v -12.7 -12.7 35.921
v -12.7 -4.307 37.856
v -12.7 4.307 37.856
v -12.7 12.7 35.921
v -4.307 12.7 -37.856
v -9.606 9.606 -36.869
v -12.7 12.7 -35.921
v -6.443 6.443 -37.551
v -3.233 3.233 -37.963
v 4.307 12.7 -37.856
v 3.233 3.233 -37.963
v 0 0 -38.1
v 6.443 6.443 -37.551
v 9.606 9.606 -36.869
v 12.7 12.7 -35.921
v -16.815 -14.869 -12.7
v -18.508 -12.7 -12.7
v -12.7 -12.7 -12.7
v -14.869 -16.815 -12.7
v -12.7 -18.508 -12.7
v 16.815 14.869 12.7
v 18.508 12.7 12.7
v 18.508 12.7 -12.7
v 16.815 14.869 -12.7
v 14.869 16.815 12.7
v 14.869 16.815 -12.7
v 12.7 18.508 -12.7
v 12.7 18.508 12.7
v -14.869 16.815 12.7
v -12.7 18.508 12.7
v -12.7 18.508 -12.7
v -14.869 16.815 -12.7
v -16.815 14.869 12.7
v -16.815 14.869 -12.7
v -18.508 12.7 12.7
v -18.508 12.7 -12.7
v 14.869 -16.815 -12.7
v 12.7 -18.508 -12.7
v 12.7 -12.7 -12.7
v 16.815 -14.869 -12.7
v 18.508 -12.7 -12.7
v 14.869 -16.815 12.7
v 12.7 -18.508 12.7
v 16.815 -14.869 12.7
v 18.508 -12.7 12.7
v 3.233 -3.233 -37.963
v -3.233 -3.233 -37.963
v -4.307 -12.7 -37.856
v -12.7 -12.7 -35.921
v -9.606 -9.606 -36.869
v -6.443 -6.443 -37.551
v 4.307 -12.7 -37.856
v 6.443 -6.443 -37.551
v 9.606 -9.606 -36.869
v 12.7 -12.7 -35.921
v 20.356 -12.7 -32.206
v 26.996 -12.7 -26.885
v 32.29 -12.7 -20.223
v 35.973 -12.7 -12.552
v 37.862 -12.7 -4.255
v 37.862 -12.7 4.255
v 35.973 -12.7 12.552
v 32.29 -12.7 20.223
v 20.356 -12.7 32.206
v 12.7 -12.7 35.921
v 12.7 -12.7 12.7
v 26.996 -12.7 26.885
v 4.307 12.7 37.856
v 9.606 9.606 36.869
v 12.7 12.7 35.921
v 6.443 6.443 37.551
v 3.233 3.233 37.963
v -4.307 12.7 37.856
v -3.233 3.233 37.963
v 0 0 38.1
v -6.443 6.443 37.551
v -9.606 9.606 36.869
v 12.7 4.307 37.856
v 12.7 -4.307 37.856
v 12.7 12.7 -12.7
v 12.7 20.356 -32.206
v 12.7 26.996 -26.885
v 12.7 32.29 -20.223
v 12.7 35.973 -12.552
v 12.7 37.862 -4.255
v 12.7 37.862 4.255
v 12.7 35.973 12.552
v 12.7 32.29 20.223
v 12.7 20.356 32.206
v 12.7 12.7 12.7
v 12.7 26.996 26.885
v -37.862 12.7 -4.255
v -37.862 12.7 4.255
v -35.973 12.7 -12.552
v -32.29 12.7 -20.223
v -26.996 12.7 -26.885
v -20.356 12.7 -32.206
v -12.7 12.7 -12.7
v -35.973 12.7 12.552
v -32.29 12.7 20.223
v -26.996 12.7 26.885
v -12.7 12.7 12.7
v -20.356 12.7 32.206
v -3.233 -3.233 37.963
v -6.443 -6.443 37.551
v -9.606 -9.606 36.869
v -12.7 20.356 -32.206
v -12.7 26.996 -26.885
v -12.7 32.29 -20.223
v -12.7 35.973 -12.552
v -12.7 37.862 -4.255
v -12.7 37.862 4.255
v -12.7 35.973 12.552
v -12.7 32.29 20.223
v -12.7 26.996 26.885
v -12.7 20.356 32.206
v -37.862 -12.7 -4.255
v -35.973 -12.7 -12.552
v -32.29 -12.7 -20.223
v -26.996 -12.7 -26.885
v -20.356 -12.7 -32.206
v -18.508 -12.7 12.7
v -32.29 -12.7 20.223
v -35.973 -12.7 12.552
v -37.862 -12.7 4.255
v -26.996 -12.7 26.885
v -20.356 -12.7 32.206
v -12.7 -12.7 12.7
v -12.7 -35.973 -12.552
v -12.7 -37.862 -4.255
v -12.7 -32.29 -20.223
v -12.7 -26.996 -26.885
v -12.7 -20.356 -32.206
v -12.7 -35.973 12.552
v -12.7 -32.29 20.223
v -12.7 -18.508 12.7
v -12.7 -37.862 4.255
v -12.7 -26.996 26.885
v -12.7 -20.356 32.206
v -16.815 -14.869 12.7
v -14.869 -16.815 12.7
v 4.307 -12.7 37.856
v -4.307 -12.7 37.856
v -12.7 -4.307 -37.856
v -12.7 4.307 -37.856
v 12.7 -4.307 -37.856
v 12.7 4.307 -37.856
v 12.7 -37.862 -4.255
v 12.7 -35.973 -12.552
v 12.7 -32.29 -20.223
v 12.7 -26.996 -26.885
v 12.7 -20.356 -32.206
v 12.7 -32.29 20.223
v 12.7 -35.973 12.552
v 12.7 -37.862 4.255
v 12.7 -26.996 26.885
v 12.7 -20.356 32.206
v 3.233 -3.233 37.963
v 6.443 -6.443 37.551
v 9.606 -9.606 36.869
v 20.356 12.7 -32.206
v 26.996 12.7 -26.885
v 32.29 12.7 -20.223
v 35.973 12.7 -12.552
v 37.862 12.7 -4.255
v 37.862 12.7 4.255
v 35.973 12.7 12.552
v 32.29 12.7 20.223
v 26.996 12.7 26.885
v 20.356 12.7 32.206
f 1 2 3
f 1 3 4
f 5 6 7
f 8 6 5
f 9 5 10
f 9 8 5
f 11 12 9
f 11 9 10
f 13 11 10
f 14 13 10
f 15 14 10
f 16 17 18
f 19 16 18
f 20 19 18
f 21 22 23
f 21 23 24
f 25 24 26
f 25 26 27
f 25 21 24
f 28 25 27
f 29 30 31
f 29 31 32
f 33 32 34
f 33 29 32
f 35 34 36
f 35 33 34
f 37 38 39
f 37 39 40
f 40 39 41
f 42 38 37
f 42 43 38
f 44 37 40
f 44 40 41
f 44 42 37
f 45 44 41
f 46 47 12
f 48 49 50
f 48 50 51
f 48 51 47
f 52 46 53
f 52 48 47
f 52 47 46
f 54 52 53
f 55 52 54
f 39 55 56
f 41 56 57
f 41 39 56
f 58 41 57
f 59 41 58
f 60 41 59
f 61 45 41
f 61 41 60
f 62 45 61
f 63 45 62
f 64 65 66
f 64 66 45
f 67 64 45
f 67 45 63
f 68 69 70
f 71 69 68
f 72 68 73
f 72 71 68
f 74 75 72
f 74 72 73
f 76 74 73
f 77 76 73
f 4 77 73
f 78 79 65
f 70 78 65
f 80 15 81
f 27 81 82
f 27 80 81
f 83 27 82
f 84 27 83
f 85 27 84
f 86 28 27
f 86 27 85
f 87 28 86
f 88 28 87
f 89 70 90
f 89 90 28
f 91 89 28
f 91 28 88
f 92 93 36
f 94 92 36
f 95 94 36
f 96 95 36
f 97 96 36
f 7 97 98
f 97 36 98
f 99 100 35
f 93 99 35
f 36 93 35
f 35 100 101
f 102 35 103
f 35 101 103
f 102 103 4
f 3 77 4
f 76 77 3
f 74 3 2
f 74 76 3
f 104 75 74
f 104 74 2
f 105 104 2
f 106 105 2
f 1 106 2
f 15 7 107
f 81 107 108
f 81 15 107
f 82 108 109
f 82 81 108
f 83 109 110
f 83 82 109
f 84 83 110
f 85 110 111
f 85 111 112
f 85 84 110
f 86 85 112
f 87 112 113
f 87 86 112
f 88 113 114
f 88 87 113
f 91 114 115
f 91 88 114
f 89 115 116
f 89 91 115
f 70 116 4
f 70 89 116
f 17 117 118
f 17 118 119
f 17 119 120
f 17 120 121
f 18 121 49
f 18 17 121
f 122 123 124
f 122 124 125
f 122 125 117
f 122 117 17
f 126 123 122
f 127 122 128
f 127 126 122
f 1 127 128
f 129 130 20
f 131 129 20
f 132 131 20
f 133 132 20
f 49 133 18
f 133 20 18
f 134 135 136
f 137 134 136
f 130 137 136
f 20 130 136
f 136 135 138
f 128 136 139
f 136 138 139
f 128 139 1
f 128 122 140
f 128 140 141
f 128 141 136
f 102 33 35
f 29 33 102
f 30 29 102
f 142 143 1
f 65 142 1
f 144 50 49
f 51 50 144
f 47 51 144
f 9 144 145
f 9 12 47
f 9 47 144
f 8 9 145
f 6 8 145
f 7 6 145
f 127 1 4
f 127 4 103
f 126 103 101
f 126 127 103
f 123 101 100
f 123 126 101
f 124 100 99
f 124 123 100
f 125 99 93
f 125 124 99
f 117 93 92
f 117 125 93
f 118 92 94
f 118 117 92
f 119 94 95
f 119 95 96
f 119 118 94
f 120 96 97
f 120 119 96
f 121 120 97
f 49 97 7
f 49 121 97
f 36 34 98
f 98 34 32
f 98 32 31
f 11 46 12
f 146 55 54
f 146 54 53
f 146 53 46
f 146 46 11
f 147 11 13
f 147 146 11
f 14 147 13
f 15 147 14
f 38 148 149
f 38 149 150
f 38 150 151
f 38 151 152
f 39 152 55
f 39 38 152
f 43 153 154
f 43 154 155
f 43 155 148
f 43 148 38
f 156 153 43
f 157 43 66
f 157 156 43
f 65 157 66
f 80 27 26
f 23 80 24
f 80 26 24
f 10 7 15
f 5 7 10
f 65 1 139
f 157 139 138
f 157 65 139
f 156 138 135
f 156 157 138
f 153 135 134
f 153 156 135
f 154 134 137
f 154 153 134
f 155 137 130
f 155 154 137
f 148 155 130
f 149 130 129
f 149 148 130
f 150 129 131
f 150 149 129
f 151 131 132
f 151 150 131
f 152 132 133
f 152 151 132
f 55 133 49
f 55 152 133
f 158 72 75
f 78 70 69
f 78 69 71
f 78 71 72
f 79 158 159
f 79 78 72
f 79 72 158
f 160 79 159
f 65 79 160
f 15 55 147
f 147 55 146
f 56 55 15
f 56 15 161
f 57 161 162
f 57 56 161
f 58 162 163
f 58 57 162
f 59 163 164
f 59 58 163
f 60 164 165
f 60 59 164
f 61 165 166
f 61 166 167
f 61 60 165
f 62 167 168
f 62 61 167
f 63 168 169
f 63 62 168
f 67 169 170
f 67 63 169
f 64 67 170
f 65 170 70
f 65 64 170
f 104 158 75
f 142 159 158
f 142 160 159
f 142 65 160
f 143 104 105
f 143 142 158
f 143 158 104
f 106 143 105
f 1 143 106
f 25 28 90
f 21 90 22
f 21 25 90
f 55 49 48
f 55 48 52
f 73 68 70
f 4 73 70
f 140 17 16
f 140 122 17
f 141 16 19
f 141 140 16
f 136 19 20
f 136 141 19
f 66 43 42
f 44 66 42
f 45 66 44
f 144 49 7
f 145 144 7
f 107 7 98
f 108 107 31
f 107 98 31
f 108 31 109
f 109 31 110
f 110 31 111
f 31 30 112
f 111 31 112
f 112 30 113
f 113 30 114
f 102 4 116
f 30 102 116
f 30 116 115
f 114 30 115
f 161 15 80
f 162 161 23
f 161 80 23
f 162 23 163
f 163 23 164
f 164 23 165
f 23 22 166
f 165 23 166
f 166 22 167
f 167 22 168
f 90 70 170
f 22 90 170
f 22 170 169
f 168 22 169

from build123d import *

# Parameters (mm, degrees)
F2_R     = 38.1
F3_DEPTH = 12.7
F1_R     = 38.1
F4_DEPTH = 12.7
F0_R     = 22.446656
F5_DEPTH = 12.7


with BuildPart() as f3:
    # F2 (on Right) → F3 (new body, symmetric)
    with BuildSketch(Plane.YZ):
        Circle(F2_R)
    extrude(amount=F3_DEPTH, both=True)

    # F1 (on Front) → F4 (join, symmetric)
    with BuildSketch(Plane.XZ):
        Circle(F1_R)
    extrude(amount=F4_DEPTH, both=True)

    # F0 (on Top) → F5 (join, symmetric)
    with BuildSketch(Plane.XY):
        Circle(F0_R)
    extrude(amount=F5_DEPTH, both=True)


solid = f3.part
